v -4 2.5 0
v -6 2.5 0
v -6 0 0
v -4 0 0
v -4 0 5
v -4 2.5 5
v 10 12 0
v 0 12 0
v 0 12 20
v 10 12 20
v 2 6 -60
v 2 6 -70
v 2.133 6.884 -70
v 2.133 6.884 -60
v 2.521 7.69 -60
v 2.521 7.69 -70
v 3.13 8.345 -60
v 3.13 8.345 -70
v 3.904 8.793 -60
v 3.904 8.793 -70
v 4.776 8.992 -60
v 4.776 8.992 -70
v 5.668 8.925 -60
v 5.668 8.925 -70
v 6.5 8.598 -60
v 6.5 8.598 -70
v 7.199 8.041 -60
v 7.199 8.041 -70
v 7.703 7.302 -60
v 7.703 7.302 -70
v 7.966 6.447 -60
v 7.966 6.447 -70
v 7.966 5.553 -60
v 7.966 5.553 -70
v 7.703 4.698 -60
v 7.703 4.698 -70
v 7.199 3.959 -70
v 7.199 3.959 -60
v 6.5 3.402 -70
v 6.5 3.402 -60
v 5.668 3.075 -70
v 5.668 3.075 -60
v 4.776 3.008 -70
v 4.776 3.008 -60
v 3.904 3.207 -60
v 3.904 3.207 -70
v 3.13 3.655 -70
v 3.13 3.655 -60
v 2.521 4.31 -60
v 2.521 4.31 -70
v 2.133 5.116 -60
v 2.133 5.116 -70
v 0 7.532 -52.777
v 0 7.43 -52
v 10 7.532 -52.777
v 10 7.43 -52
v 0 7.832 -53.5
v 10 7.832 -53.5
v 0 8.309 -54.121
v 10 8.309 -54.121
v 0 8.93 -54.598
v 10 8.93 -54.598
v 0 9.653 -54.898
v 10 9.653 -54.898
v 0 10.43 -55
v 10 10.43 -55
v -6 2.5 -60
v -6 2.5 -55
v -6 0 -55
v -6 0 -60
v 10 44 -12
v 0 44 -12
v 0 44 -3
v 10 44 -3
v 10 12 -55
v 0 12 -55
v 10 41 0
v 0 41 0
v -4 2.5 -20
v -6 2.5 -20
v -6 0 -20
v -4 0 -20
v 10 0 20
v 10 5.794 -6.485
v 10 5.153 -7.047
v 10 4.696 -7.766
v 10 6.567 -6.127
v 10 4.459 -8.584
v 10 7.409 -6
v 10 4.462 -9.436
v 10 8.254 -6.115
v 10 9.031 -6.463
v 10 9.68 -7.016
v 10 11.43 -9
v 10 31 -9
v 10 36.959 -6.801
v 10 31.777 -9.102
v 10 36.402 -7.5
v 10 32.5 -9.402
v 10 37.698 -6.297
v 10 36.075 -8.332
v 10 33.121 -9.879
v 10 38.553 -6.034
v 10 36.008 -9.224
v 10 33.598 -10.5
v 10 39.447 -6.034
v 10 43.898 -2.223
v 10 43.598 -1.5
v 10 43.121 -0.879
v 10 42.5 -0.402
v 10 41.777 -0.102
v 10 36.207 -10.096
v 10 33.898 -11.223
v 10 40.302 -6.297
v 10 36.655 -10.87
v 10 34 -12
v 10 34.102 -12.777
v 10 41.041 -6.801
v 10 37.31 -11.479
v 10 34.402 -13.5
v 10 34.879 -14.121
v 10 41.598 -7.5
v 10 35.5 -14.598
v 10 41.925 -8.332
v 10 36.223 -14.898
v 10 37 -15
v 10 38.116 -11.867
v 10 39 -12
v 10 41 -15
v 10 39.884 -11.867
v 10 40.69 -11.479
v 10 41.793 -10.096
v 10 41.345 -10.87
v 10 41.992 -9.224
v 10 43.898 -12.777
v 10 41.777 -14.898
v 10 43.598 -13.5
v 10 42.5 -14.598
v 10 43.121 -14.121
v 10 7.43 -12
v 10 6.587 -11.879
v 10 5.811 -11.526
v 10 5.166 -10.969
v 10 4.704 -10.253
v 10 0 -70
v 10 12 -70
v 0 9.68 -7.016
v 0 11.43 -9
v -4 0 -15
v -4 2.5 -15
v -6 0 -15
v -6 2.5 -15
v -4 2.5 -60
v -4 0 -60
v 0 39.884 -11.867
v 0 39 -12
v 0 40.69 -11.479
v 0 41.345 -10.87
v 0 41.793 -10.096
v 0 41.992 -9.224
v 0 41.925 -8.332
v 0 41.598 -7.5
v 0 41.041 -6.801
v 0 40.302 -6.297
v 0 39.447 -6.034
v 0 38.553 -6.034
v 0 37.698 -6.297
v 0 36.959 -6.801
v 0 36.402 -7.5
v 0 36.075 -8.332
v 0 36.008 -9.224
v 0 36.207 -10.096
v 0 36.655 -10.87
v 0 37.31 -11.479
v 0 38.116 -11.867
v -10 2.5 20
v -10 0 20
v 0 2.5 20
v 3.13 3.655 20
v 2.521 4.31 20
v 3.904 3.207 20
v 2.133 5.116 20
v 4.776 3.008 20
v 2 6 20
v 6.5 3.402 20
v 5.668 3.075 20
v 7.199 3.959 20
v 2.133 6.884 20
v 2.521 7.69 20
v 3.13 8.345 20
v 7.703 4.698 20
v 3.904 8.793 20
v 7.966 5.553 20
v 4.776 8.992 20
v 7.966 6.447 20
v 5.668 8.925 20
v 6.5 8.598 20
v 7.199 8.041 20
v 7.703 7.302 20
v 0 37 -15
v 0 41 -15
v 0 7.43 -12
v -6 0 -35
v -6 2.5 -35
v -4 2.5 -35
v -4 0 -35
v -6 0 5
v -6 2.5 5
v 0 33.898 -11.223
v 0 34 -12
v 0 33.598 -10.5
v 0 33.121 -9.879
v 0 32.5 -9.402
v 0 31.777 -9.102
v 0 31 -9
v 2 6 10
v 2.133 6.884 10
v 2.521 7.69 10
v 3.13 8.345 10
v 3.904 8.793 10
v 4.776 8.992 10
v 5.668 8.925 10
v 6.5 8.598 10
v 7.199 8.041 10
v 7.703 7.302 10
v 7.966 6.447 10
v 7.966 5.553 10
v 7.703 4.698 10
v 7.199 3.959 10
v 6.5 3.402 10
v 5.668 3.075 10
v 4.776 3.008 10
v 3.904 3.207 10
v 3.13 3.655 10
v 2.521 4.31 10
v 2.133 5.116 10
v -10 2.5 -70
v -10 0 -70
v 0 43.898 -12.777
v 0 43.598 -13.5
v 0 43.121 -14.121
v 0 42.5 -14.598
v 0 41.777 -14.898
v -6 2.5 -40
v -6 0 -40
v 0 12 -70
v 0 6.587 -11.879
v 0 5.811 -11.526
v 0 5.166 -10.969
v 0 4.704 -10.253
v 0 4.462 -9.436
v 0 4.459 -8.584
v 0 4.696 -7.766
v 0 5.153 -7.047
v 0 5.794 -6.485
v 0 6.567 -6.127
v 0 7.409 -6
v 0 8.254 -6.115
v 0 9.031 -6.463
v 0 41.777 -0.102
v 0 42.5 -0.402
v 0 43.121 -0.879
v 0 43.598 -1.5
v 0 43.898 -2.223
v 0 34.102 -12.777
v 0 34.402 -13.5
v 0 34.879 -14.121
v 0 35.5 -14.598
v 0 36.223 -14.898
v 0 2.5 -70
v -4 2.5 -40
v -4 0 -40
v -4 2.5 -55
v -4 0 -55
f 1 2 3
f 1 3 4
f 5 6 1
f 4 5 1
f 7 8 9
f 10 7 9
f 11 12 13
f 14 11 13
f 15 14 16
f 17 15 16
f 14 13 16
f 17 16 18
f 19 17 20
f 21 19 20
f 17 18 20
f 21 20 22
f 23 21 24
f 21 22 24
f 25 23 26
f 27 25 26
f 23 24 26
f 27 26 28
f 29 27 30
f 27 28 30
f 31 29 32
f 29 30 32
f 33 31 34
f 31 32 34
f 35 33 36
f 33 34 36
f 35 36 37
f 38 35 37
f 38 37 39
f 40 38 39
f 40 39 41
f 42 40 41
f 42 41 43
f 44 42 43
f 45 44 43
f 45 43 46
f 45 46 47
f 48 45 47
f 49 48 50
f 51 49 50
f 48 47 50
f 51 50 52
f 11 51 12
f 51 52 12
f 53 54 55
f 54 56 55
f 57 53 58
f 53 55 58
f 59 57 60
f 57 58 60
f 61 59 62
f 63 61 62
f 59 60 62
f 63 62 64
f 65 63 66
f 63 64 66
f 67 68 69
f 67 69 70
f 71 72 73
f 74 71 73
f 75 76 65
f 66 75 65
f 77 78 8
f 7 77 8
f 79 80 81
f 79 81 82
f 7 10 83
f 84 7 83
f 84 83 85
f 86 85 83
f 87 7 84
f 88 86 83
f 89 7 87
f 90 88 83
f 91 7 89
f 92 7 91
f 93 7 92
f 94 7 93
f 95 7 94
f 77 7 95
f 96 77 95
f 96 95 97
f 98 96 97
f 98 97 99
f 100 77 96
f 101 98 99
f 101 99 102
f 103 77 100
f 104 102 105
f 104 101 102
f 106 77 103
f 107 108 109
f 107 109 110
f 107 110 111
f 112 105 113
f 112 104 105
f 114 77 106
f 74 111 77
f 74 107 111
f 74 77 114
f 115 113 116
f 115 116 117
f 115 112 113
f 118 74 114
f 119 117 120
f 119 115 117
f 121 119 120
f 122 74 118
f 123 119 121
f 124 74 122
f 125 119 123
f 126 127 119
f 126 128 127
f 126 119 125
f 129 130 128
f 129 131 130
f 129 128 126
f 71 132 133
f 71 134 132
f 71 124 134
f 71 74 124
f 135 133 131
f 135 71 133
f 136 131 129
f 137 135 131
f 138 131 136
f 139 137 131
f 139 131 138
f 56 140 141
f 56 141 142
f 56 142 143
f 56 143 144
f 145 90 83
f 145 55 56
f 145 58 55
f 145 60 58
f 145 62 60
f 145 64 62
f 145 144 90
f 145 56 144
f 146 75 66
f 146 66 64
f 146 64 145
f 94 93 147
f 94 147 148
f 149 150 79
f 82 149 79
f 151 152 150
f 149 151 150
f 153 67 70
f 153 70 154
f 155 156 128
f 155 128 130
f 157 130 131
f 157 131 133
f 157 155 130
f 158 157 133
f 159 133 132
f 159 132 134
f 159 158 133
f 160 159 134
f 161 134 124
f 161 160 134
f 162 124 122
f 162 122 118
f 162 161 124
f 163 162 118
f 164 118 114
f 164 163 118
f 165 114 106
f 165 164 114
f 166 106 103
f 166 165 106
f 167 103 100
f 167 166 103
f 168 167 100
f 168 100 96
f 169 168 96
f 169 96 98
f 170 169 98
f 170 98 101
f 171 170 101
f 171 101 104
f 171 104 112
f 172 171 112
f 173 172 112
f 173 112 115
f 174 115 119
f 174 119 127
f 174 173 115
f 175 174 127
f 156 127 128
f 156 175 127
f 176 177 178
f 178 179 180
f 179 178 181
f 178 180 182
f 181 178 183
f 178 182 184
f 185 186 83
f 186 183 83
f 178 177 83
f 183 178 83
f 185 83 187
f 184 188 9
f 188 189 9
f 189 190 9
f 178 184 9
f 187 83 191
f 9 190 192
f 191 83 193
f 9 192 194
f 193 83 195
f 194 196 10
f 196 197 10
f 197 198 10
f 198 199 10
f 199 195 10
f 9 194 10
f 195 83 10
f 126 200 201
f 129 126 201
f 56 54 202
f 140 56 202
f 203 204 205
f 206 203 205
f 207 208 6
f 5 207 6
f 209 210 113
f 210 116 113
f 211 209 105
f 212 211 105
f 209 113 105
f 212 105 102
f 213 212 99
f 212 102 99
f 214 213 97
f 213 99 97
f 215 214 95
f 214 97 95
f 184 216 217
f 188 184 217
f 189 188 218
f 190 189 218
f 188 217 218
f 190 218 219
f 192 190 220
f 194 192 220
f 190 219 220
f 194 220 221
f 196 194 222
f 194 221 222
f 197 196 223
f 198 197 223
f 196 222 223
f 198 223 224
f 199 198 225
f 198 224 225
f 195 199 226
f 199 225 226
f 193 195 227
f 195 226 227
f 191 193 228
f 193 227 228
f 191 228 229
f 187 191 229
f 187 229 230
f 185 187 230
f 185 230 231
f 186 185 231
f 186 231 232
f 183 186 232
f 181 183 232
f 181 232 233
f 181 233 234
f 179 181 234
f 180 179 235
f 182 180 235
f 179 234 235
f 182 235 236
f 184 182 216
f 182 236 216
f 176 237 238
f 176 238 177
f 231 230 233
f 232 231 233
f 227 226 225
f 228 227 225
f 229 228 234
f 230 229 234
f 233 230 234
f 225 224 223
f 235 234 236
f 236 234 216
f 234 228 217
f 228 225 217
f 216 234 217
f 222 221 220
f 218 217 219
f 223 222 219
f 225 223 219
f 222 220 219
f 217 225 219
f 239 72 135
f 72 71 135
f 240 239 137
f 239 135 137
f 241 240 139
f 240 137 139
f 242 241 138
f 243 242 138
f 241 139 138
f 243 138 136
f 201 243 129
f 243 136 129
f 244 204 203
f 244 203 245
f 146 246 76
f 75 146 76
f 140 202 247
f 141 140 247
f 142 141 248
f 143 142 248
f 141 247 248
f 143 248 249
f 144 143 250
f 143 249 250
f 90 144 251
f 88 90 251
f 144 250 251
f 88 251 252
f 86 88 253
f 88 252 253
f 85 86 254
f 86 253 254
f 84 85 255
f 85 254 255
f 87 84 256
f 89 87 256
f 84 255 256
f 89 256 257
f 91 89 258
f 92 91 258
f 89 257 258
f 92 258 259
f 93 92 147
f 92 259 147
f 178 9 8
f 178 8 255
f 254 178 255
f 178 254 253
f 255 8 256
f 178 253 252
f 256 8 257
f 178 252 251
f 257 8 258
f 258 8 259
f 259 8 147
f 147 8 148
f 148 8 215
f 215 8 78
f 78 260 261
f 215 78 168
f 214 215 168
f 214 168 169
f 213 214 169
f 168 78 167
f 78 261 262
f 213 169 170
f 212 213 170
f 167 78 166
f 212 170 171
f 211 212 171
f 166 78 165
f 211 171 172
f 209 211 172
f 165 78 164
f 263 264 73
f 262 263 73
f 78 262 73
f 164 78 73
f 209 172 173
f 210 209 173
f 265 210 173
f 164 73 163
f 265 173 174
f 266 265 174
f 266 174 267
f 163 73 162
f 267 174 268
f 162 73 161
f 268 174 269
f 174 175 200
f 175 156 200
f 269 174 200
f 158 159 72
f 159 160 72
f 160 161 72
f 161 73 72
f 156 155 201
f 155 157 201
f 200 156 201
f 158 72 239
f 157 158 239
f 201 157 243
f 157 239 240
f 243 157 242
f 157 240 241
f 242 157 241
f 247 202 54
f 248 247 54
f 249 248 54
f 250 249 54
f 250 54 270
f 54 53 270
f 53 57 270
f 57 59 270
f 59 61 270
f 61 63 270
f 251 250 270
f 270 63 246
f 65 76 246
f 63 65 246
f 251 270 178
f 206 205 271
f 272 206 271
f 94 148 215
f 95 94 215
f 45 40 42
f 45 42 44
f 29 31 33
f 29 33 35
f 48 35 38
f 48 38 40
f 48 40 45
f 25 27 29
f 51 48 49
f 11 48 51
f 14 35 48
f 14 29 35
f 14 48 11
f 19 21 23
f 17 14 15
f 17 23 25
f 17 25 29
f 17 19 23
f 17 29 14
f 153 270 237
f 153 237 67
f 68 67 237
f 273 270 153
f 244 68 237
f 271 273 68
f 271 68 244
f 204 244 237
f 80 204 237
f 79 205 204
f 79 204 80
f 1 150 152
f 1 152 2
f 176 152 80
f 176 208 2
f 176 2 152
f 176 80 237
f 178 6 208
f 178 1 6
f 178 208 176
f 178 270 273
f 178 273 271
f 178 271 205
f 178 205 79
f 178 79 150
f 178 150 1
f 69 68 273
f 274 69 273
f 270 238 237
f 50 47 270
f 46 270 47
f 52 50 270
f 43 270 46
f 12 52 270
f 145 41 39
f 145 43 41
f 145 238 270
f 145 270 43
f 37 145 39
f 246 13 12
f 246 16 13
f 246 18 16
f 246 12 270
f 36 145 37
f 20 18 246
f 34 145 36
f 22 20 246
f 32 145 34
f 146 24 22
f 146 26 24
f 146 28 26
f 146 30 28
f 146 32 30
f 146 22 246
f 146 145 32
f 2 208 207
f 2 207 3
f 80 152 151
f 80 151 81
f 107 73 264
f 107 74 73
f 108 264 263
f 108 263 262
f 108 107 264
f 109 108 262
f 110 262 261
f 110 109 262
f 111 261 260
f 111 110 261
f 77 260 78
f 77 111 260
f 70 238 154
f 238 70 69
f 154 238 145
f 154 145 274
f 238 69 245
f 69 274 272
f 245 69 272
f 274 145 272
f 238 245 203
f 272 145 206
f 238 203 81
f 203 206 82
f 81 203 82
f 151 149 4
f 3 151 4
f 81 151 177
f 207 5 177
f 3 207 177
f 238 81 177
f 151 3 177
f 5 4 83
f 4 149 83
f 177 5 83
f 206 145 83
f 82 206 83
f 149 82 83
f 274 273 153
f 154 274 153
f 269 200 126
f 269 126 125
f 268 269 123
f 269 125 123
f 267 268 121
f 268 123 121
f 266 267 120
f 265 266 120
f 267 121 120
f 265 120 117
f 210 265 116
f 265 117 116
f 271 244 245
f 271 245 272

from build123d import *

# Parameters (mm, degrees)
ESBO_O1_R                = 3
RESSALTO_EXTRUS_O1_DEPTH = 10
ESBO_O2_R                = 3
CORTE_EXTRUS_O1_DEPTH    = 10
CORTE_EXTRUS_O2_START    = -80
ESBO_O2_2_R              = 3
CORTE_EXTRUS_O2_DEPTH    = 10
FILETE1_R                = 3
ESBO_O3_W                = 90
ESBO_O3_H                = 2.5
RESSALTO_EXTRUS_O2_DEPTH = 10
ESBO_O4_W                = 2
ESBO_O4_H                = 5
CORTE_EXTRUS_O3_DEPTH    = 10
PADR_O_LINEAR1_COUNT     = 4
PADR_O_LINEAR1_PITCH     = 20


with BuildPart() as part:
    # Esboço1 → Ressalto-extrusão1 (new body)
    with BuildSketch(Plane(origin=(0, 0, 0), x_dir=(0, 0, -1), z_dir=(1, 0, 0))):
        with BuildLine():
            Line((15, 44), (0, 44))
            Line((0, 44), (0, 12))
            Line((0, 12), (-20, 12))
            Line((-20, 12), (-20, 0))
            Line((-20, 0), (70, 0))
            Line((70, 0), (70, 12))
            Line((70, 12), (55, 12))
            Line((55, 12), (55, 7.43))
            Line((55, 7.43), (12, 7.43))
            ThreePointArc((12, 7.43), (7.765686518, 4.695686516), (7.015686515, 9.679999999))
            Line((7.015686515, 9.679999999), (9, 11.430000002))
            Line((9, 11.430000002), (9, 34))
            Line((9, 34), (15, 34))
            Line((15, 34), (15, 44))
        make_face()
        with Locations((9, 39)):
            Circle(ESBO_O1_R, mode=Mode.SUBTRACT)
    extrude(amount=RESSALTO_EXTRUS_O1_DEPTH)

    # Esboço2 → Corte-extrusão1 (cut)
    with BuildSketch(Plane(origin=(0, 0, -70), x_dir=(-1, 0, 0), z_dir=(0, 0, -1))):
        with Locations((-5, 6)):
            Circle(ESBO_O2_R)
    extrude(amount=-CORTE_EXTRUS_O1_DEPTH, mode=Mode.SUBTRACT)

    # Esboço2<2> → Corte-extrusão2 (cut)
    with BuildSketch(Plane(origin=(0, 0, -70), x_dir=(-1, 0, 0), z_dir=(0, 0, -1)).offset(CORTE_EXTRUS_O2_START)):
        with Locations((-5, 6)):
            Circle(ESBO_O2_2_R)
    extrude(amount=-CORTE_EXTRUS_O2_DEPTH, mode=Mode.SUBTRACT)

    # Filete1
    filete1_edges = [part.edges().sort_by_distance(p)[0] for p in [
        (5, 7.43, -55),
        (5, 44, 0),
        (5, 44, -15),
        (5, 34, -15),
        (5, 34, -9),
    ]]
    fillet(filete1_edges, radius=FILETE1_R - 0.0001)  # a hair under: the kernel refuses the full size

    # Esboço3 → Ressalto-extrusão2 (add)
    with BuildSketch(Plane.ZY):
        with Locations((-25, 1.25)):
            Rectangle(ESBO_O3_W, ESBO_O3_H)
    extrude(amount=RESSALTO_EXTRUS_O2_DEPTH)

    # Esboço4 → Corte-extrusão3 (cut)
    with BuildSketch(Plane(origin=(0, 2.5, 0), x_dir=(1, 0, 0), z_dir=(0, 1, 0))):
        with Locations((-5, 57.5)):
            Rectangle(ESBO_O4_W, ESBO_O4_H)
    corte_extrus_o3 = extrude(amount=-CORTE_EXTRUS_O3_DEPTH, mode=Mode.SUBTRACT)

    # Padrão linear1: Corte-extrusão3 ×4
    with Locations(*[(0, 0, i * PADR_O_LINEAR1_PITCH) for i in range(1, PADR_O_LINEAR1_COUNT)]):
        add(corte_extrus_o3, mode=Mode.SUBTRACT)


solid = part.part
